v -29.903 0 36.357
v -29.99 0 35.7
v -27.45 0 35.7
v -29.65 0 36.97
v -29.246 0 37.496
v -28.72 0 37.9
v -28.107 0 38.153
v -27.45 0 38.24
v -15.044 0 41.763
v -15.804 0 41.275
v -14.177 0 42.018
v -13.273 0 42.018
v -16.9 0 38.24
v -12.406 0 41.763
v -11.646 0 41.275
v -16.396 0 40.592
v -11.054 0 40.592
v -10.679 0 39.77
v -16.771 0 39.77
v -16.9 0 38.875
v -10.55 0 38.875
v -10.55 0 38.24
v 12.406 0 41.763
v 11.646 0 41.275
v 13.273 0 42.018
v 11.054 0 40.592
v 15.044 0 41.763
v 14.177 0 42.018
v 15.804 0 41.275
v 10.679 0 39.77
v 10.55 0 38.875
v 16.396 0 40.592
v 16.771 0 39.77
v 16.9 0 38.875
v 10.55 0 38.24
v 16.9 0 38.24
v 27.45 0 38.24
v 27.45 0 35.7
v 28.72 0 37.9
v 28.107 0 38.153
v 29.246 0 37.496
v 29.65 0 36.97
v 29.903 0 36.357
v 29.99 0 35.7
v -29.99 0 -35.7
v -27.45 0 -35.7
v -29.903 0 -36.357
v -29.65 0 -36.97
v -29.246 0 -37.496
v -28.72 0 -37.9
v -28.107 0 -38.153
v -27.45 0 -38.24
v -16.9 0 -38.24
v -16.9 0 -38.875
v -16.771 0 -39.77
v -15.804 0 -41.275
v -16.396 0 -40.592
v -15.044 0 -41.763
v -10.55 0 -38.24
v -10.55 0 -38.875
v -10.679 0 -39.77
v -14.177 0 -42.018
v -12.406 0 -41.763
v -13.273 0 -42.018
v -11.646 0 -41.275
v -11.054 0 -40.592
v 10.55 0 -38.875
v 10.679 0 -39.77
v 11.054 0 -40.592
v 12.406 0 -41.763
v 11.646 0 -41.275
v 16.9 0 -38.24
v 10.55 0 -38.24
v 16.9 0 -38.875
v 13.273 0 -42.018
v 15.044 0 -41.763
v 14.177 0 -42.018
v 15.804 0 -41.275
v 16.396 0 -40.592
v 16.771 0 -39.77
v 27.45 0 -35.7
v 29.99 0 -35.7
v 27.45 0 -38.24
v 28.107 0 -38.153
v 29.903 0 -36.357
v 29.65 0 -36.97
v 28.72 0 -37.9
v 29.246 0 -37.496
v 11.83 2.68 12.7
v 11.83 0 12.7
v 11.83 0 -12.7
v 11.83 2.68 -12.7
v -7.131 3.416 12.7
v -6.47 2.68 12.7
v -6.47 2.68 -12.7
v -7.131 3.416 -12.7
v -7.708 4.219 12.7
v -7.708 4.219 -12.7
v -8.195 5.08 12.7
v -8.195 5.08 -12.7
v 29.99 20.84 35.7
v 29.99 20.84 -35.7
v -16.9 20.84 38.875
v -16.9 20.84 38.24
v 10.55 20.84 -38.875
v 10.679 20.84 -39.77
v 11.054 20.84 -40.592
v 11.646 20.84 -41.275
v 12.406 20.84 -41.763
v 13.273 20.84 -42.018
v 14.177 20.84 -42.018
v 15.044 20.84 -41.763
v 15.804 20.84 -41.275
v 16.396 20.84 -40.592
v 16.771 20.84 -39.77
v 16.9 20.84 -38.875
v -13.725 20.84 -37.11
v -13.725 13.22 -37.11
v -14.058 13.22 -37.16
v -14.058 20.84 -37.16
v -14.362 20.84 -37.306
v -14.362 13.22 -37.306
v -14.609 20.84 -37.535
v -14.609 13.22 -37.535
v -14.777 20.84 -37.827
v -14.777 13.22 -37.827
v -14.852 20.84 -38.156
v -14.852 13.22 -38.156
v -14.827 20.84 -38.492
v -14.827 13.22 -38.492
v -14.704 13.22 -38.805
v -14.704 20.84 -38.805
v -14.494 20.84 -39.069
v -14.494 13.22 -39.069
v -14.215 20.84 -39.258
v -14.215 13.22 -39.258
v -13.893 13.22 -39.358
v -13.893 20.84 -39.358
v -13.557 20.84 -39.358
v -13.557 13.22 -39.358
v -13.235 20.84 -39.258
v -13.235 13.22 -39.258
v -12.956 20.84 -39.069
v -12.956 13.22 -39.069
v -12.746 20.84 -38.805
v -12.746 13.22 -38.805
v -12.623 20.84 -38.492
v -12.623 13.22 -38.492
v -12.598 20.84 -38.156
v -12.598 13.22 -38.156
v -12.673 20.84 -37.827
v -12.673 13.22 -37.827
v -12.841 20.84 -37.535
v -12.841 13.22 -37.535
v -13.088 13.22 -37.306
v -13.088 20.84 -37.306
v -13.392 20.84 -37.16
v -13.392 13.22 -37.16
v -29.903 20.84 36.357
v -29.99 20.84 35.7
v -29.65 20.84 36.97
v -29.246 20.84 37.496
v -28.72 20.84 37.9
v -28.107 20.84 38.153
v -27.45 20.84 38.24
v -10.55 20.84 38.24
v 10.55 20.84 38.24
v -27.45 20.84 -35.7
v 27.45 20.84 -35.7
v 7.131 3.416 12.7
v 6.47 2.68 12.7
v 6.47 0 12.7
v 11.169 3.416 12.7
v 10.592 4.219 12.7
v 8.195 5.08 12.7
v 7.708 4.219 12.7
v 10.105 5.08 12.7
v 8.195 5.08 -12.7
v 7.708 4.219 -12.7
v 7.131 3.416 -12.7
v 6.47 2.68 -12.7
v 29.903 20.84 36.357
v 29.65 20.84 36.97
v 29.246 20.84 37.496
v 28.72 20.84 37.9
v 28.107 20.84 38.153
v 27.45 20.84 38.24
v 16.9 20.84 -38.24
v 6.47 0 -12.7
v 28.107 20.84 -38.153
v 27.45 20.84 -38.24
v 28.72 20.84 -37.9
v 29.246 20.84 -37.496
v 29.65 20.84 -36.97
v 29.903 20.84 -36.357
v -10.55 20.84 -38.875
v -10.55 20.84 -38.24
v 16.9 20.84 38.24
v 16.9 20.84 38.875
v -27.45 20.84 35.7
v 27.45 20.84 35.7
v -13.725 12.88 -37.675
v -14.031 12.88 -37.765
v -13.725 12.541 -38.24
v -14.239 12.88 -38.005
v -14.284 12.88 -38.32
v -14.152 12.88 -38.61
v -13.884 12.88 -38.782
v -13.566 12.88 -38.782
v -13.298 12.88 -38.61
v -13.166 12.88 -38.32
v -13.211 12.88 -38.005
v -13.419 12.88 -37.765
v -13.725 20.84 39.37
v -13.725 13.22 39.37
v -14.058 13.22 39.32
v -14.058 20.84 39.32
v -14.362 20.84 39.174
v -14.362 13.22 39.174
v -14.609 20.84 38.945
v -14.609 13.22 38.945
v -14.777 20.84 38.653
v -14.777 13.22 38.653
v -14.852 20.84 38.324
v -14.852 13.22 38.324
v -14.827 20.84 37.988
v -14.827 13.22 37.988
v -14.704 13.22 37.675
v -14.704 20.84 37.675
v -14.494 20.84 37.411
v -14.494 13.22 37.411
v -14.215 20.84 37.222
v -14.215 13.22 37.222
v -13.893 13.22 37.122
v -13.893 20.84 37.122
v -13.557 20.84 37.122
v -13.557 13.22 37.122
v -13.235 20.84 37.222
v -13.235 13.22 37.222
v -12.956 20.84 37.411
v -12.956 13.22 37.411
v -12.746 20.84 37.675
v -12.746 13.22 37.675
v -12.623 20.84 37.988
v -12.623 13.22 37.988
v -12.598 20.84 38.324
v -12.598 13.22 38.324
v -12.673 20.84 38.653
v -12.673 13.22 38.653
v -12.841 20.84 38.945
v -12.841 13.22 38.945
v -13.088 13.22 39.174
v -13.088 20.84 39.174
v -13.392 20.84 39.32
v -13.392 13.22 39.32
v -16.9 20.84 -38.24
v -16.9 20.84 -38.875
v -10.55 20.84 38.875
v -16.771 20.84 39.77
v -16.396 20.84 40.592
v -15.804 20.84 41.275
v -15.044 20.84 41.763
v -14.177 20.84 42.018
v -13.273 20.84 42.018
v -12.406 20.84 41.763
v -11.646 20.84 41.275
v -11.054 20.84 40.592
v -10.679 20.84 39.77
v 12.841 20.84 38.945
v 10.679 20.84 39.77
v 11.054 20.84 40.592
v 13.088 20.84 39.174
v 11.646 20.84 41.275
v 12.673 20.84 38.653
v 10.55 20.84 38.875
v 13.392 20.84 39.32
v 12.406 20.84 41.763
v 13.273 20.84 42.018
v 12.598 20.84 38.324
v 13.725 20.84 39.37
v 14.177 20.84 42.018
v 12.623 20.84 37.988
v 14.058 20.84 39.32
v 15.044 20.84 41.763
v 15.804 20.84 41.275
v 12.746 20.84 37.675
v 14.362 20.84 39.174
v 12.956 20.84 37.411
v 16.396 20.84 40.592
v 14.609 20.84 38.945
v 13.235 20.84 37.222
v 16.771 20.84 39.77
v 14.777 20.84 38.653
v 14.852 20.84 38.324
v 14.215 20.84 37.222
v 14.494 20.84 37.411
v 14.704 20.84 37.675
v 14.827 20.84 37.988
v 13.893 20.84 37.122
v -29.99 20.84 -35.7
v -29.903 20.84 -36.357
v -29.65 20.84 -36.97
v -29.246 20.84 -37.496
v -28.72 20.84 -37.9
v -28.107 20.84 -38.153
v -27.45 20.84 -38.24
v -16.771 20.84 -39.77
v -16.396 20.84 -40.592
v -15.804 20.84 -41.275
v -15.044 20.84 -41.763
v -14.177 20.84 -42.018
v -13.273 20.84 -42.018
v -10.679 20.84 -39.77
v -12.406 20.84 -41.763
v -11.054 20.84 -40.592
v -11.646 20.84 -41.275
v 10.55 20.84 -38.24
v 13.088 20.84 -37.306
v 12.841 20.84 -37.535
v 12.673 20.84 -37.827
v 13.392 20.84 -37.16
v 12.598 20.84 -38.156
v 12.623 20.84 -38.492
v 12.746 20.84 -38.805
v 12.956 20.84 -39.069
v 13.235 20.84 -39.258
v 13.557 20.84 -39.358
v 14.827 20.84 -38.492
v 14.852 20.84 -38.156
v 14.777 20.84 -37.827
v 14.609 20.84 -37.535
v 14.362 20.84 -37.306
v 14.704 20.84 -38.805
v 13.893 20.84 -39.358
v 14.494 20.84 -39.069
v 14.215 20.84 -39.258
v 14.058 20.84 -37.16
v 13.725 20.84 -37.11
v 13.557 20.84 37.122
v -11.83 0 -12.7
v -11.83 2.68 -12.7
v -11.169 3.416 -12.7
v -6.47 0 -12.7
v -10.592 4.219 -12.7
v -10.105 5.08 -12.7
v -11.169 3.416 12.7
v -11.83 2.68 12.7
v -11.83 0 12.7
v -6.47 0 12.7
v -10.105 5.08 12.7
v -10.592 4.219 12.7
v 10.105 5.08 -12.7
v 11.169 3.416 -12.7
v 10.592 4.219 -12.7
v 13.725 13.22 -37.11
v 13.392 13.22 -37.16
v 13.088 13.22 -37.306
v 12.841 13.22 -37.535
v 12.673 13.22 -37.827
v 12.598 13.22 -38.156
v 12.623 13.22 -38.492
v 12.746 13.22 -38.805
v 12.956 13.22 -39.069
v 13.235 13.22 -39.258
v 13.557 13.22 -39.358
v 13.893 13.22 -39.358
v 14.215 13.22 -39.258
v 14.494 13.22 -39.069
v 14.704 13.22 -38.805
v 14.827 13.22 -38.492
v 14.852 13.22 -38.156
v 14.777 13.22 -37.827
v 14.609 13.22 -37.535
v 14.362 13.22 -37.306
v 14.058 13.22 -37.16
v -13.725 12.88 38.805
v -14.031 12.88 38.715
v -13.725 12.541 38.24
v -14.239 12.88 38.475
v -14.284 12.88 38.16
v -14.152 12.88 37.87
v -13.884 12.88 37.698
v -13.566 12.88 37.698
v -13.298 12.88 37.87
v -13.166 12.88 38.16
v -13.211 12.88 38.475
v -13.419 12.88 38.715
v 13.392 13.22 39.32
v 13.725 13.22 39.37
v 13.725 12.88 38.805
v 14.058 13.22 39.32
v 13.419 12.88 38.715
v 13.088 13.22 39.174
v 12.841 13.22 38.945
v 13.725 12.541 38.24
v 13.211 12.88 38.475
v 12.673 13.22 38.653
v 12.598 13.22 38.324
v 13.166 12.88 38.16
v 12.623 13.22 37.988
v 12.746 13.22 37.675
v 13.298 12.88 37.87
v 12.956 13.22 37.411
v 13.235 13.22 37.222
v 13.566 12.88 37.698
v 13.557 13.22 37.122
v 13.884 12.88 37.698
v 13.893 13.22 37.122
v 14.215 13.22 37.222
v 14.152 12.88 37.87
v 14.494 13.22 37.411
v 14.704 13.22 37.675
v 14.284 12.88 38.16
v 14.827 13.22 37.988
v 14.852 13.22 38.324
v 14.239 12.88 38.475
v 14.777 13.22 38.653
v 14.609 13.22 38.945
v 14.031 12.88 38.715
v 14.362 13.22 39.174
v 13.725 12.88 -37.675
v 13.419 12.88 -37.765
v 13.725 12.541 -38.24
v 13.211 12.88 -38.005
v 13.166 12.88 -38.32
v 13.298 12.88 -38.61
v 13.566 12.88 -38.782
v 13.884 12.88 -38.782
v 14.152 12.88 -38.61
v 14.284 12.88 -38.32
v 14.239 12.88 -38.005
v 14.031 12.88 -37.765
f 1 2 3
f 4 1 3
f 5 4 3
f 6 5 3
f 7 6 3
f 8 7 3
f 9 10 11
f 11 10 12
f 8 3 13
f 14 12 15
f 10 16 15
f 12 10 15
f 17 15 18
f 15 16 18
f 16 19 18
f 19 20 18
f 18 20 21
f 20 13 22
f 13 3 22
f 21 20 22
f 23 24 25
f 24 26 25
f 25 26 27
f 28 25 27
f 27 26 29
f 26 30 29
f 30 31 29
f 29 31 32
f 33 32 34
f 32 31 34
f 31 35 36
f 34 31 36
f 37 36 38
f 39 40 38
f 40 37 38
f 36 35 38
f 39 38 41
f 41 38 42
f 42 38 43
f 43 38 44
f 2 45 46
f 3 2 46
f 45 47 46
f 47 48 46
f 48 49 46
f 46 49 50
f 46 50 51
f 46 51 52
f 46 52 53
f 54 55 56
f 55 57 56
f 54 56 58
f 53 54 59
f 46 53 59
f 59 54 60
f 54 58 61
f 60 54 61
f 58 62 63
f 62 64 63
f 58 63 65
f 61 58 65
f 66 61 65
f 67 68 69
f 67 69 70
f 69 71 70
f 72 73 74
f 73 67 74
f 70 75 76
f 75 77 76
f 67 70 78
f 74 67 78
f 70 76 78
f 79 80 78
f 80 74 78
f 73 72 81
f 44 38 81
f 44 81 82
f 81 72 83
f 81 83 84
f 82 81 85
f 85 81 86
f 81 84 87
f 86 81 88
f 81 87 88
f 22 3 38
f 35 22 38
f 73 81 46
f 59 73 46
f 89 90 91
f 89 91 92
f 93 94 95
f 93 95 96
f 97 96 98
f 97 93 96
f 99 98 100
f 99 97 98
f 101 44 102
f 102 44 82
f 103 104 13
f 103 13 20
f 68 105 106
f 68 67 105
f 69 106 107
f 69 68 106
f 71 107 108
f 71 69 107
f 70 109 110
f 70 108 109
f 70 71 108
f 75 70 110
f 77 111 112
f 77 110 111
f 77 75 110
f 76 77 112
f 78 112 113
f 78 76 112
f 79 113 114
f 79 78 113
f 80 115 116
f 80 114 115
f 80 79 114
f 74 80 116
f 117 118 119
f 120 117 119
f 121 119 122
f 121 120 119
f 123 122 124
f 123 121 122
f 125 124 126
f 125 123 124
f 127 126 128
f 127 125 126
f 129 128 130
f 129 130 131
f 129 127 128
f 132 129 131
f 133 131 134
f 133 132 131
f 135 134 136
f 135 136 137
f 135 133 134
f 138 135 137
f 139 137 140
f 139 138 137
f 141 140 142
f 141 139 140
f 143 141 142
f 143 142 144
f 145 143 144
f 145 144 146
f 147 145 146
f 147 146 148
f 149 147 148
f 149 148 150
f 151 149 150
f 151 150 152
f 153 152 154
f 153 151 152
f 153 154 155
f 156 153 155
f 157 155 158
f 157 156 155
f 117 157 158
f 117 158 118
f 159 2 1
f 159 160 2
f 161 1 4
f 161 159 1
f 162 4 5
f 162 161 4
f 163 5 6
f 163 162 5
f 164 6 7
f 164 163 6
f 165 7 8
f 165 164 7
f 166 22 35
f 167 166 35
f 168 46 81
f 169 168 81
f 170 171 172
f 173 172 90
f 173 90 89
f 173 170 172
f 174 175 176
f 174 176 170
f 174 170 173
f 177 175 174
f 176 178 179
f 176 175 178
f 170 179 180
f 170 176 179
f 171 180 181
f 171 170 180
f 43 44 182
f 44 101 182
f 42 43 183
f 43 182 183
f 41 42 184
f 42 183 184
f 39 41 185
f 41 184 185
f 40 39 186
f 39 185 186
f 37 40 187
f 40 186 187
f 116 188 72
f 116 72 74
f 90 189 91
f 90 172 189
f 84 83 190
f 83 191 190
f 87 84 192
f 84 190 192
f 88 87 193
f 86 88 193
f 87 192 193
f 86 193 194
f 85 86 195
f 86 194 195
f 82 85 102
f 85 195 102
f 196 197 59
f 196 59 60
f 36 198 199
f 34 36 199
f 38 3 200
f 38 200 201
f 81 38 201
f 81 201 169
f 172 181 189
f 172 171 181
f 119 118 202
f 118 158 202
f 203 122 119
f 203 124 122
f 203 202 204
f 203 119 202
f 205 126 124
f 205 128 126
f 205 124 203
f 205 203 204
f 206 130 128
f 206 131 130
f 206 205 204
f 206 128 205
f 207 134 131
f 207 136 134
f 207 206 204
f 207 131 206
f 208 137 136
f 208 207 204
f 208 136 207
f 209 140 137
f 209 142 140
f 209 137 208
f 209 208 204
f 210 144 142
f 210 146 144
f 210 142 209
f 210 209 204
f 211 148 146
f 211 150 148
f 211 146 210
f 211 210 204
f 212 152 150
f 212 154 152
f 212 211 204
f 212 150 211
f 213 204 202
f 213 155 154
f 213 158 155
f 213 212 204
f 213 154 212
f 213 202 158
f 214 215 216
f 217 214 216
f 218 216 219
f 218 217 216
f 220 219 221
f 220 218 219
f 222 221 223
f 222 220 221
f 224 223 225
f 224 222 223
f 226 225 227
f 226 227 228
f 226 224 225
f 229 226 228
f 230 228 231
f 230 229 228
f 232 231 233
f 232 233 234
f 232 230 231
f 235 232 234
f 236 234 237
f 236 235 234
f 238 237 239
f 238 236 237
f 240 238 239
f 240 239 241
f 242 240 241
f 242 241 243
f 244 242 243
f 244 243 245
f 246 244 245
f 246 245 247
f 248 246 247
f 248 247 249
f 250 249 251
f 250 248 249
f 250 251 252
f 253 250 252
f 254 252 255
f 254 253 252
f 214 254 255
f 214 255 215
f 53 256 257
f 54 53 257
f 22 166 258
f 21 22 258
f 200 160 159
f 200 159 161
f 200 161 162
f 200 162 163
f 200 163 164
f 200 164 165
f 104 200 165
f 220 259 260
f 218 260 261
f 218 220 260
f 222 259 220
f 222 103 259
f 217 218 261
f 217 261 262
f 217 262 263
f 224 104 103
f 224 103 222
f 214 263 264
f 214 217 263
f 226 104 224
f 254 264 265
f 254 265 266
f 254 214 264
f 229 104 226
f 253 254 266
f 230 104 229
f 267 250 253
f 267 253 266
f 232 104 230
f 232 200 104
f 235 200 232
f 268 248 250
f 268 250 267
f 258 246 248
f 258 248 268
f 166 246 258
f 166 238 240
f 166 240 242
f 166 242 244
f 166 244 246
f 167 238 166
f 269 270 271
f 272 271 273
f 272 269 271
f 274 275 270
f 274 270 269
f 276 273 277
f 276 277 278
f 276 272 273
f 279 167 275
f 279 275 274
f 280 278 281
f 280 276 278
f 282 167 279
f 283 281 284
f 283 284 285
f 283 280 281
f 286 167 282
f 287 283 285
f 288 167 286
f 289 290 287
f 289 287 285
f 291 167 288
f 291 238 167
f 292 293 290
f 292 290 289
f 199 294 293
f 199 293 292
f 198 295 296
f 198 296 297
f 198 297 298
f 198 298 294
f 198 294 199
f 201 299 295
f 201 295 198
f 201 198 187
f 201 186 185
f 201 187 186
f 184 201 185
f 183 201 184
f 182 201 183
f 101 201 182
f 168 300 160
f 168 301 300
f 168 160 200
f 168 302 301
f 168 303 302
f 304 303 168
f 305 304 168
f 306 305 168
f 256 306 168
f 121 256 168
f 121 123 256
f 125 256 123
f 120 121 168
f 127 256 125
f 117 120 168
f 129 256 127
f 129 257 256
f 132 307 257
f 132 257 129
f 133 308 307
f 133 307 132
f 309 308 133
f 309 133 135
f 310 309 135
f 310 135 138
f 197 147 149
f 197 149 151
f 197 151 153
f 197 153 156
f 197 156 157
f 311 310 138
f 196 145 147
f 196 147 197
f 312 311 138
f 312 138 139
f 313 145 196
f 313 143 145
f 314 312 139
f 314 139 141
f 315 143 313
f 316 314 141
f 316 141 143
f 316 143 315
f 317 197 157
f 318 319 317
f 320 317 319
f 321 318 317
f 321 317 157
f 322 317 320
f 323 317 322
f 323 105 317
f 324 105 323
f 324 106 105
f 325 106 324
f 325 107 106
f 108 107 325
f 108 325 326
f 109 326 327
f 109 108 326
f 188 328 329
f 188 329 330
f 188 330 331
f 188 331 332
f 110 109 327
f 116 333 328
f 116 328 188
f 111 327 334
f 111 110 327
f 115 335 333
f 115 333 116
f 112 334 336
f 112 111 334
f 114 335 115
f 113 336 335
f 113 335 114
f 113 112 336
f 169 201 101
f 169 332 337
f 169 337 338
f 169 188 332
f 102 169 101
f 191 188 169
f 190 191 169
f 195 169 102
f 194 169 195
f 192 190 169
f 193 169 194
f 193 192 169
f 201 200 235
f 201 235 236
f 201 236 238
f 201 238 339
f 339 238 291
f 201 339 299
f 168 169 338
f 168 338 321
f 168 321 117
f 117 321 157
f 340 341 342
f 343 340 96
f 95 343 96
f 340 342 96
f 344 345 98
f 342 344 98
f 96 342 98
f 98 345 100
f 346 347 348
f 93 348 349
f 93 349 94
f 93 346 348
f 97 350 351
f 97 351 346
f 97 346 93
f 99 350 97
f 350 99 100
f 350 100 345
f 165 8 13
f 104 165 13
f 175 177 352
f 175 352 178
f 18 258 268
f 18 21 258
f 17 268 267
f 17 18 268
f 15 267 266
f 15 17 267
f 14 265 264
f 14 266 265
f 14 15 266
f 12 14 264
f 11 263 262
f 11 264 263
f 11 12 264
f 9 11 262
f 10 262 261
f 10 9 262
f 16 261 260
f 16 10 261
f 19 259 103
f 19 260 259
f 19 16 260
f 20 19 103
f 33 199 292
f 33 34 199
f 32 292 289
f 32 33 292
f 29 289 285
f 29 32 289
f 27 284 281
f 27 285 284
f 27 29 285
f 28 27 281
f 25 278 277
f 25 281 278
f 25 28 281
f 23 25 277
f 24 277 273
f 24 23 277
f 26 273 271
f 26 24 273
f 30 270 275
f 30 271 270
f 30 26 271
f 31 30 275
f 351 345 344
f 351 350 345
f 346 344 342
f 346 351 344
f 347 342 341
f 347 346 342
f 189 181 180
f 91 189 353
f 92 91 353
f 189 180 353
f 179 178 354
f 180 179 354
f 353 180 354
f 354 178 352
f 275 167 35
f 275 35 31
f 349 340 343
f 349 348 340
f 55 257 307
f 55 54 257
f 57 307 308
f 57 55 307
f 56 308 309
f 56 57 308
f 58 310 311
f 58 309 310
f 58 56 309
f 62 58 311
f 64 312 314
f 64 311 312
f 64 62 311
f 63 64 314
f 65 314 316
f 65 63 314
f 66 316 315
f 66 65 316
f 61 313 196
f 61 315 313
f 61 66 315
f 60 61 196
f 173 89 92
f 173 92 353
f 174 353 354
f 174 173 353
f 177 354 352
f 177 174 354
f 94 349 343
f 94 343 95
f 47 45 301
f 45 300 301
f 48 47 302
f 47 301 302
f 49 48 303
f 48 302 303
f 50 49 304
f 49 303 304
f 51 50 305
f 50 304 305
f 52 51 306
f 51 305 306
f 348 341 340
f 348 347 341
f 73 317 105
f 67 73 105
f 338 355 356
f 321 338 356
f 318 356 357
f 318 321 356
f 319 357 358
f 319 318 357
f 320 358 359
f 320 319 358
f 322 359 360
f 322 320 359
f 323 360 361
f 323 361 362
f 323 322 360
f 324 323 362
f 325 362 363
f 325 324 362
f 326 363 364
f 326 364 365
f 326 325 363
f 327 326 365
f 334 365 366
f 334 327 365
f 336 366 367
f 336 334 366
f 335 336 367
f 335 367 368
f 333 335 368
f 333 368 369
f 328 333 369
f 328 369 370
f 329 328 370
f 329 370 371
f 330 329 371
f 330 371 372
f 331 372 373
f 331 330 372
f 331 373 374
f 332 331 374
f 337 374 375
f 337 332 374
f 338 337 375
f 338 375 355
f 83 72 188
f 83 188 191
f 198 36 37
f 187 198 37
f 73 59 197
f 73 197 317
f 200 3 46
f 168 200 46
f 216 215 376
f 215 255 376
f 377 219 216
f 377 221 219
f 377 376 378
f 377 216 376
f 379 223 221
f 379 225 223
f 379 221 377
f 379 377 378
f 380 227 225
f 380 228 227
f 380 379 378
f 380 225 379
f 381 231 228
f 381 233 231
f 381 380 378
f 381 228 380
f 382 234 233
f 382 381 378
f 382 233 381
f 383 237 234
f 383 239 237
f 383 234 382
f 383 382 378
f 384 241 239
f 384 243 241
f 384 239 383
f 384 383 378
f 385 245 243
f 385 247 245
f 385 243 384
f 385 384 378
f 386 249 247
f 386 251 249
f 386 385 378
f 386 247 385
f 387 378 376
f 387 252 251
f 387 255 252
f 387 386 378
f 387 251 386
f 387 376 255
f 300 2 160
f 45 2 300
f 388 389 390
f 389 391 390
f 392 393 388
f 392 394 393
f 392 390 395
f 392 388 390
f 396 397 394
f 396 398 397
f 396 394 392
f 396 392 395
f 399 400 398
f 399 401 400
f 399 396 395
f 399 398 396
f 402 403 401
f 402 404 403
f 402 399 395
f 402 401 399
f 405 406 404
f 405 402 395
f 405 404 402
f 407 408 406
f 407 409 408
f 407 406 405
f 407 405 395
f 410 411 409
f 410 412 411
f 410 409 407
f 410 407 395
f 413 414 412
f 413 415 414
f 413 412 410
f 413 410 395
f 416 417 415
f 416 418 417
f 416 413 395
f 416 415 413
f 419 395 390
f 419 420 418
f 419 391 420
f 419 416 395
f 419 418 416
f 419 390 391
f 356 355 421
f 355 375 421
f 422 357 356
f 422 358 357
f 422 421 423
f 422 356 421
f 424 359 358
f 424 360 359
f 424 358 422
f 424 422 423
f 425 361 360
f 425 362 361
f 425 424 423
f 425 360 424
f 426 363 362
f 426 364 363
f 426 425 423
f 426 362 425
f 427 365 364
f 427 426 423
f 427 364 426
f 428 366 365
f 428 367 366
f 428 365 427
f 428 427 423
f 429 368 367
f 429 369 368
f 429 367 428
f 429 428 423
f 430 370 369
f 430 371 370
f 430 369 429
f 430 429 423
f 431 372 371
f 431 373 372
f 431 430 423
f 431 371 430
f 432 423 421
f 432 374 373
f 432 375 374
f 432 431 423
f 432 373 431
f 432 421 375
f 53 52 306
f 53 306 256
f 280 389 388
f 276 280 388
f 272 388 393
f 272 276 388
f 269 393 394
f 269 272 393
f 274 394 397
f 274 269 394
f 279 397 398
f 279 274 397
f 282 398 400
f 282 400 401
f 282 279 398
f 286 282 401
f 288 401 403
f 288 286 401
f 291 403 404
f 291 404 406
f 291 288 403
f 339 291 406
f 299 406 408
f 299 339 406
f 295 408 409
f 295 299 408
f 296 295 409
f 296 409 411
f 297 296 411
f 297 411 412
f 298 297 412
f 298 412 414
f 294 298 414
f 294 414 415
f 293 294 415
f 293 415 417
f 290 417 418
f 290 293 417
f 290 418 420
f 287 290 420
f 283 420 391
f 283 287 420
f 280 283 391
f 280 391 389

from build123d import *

# Parameters (mm, degrees)
BOSS_EXTRUDE1_OUTLINE_W        = 59.98
BOSS_EXTRUDE1_OUTLINE_H        = 76.48
BOSS_EXTRUDE1_OUTLINE_W_2      = 54.9
BOSS_EXTRUDE1_OUTLINE_H_2      = 71.4
BOSS_EXTRUDE1_DEPTH            = 20.839999976
BOSS_EXTRUDE2_DEPTH            = 12.7
LPATTERN2_COUNT                = 2
LPATTERN2_PITCH                = 18.3
SKETCH6_W                      = 6.35
SKETCH6_H                      = 3.81
BOSS_EXTRUDE3_DEPTH            = 20.839999976
MIRROR2_COPY_1_SKETCH_W        = 6.35
MIRROR2_COPY_1_SKETCH_H        = 3.81
MIRROR2_COPY_1_DEPTH           = 20.839999976
F_4_40_TAPPED_HOLE1_AT_2_COUNT = 2
F_4_40_TAPPED_HOLE1_AT_2_PITCH = 27.45
F_4_40_TAPPED_HOLE1_AT_3_COUNT = 2
F_4_40_TAPPED_HOLE1_AT_3_PITCH = 81.25695601
F_4_40_TAPPED_HOLE1_AT_4_COUNT = 2
F_4_40_TAPPED_HOLE1_AT_4_PITCH = 76.48
FILLET1_RADIUS                 = 3.175
FILLET1_LENGTH                 = 20.839999976
FILLET2_RADIUS                 = 3.175
FILLET2_LENGTH                 = 20.839999976
FILLET3_RADIUS                 = 3.175
FILLET3_LENGTH                 = 20.839999976
FILLET4_RADIUS                 = 3.175
FILLET4_LENGTH                 = 20.839999976
FILLET5_R                      = 2.54


# Read off the part's stored shape, not the designer's step: Boss-Extrude1
with BuildPart() as part:
    # Boss-Extrude1 outline → Boss-Extrude1 (new body)
    with BuildSketch(Plane(origin=(0, 0, 0), x_dir=(1, 0, 0), z_dir=(0, 1, 0))):
        Rectangle(BOSS_EXTRUDE1_OUTLINE_W, BOSS_EXTRUDE1_OUTLINE_H)
        Rectangle(BOSS_EXTRUDE1_OUTLINE_W_2, BOSS_EXTRUDE1_OUTLINE_H_2, mode=Mode.SUBTRACT)
    extrude(amount=BOSS_EXTRUDE1_DEPTH)

    # Sketch6 → Boss-Extrude3 (add)
    with BuildSketch(Plane(origin=(0, 20.839999976, 0), x_dir=(1, 0, 0), z_dir=(0, 1, 0))):
        with Locations((-13.725, 40.145)):
            Rectangle(SKETCH6_W, SKETCH6_H)
    boss_extrude3 = extrude(amount=-BOSS_EXTRUDE3_DEPTH)

    # Mirror1: Boss-Extrude3 across plane
    add(boss_extrude3.mirror(Plane(origin=(0, 0, 0), x_dir=(0, 0, 1), z_dir=(1, 0, 0))))

    # Mirror2: Boss-Extrude3 across plane
    add(boss_extrude3.mirror(Plane.XY))

    # Mirror2 copy 1 sketch → Mirror2 copy 1 (add)
    with BuildSketch(Plane(origin=(0, 20.839999976, 0), x_dir=(-1, 0, 0), z_dir=(0, 1, 0))):
        with Locations((-13.725, 40.145)):
            Rectangle(MIRROR2_COPY_1_SKETCH_W, MIRROR2_COPY_1_SKETCH_H)
    extrude(amount=-MIRROR2_COPY_1_DEPTH)

    # Sketch7 → #4-40 Tapped Hole1 (revolve, cut)
    with BuildSketch(Plane(origin=(-13.725, 20.839999976, -38.24), x_dir=(0, 0, 1), z_dir=(1, 0, 0))):
        Polygon((0, 0), (0, 8.299152758), (1.1303, 7.62), (1.1303, 0), align=None)
    f_4_40_tapped_hole1 = revolve(axis=Axis((-13.725, 27.189999976, -38.24), (0, -1, 0)), mode=Mode.SUBTRACT)

    # #4-40 Tapped Hole1 at 2: #4-40 Tapped Hole1 ×2
    with Locations(*[(i * F_4_40_TAPPED_HOLE1_AT_2_PITCH, 0, 0) for i in range(1, F_4_40_TAPPED_HOLE1_AT_2_COUNT)]):
        add(f_4_40_tapped_hole1, mode=Mode.SUBTRACT)

    # #4-40 Tapped Hole1 at 3: #4-40 Tapped Hole1 ×2
    with Locations(*[Vector(0.3378172324920079, 0, 0.9412117282691715) * (i * F_4_40_TAPPED_HOLE1_AT_3_PITCH) for i in range(1, F_4_40_TAPPED_HOLE1_AT_3_COUNT)]):
        add(f_4_40_tapped_hole1, mode=Mode.SUBTRACT)

    # #4-40 Tapped Hole1 at 4: #4-40 Tapped Hole1 ×2
    with Locations(*[(0, 0, i * F_4_40_TAPPED_HOLE1_AT_4_PITCH) for i in range(1, F_4_40_TAPPED_HOLE1_AT_4_COUNT)]):
        add(f_4_40_tapped_hole1, mode=Mode.SUBTRACT)

    # Fillet1: full round fillet: the end face becomes a half cylinder, R = half its width
    fillet1_face = Plane((-13.725, 10.419999988, -42.05), x_dir=(0, -1, 0), z_dir=(0, 0, -1))  # on the end face: x along it, z out of the body
    fillet1_slab = fillet1_face.offset(-FILLET1_RADIUS / 2) * Box(FILLET1_LENGTH, 2 * FILLET1_RADIUS, FILLET1_RADIUS, mode=Mode.PRIVATE)  # the body's end, R deep
    fillet1_round = Plane((-13.725, 10.419999988, -38.875), x_dir=(0, 0, -1), z_dir=(0, -1, 0)) * Cylinder(FILLET1_RADIUS, FILLET1_LENGTH, mode=Mode.PRIVATE)  # its axis R under the face
    add(fillet1_slab - fillet1_round, mode=Mode.SUBTRACT)

    # Fillet2: full round fillet: the end face becomes a half cylinder, R = half its width
    fillet2_face = Plane((13.725, 10.419999988, -42.05), x_dir=(0, -1, 0), z_dir=(0, 0, -1))  # on the end face: x along it, z out of the body
    fillet2_slab = fillet2_face.offset(-FILLET2_RADIUS / 2) * Box(FILLET2_LENGTH, 2 * FILLET2_RADIUS, FILLET2_RADIUS, mode=Mode.PRIVATE)  # the body's end, R deep
    fillet2_round = Plane((13.725, 10.419999988, -38.875), x_dir=(0, 0, -1), z_dir=(0, -1, 0)) * Cylinder(FILLET2_RADIUS, FILLET2_LENGTH, mode=Mode.PRIVATE)  # its axis R under the face
    add(fillet2_slab - fillet2_round, mode=Mode.SUBTRACT)

    # Fillet3: full round fillet: the end face becomes a half cylinder, R = half its width
    fillet3_face = Plane((13.725, 10.419999988, 42.05), x_dir=(0, -1, 0), z_dir=(0, 0, 1))  # on the end face: x along it, z out of the body
    fillet3_slab = fillet3_face.offset(-FILLET3_RADIUS / 2) * Box(FILLET3_LENGTH, 2 * FILLET3_RADIUS, FILLET3_RADIUS, mode=Mode.PRIVATE)  # the body's end, R deep
    fillet3_round = Plane((13.725, 10.419999988, 38.875), x_dir=(0, 0, 1), z_dir=(0, -1, 0)) * Cylinder(FILLET3_RADIUS, FILLET3_LENGTH, mode=Mode.PRIVATE)  # its axis R under the face
    add(fillet3_slab - fillet3_round, mode=Mode.SUBTRACT)

    # Fillet4: full round fillet: the end face becomes a half cylinder, R = half its width
    fillet4_face = Plane((-13.725, 10.419999988, 42.05), x_dir=(0, -1, 0), z_dir=(0, 0, 1))  # on the end face: x along it, z out of the body
    fillet4_slab = fillet4_face.offset(-FILLET4_RADIUS / 2) * Box(FILLET4_LENGTH, 2 * FILLET4_RADIUS, FILLET4_RADIUS, mode=Mode.PRIVATE)  # the body's end, R deep
    fillet4_round = Plane((-13.725, 10.419999988, 38.875), x_dir=(0, 0, 1), z_dir=(0, -1, 0)) * Cylinder(FILLET4_RADIUS, FILLET4_LENGTH, mode=Mode.PRIVATE)  # its axis R under the face
    add(fillet4_slab - fillet4_round, mode=Mode.SUBTRACT)

    # Fillet5
    fillet5_edges = [part.edges().sort_by_distance(p)[0] for p in [
        (29.99, 10.419999988, 38.24),
        (29.99, 10.419999988, -38.24),
        (-29.99, 10.419999988, -38.24),
        (-29.99, 10.419999988, 38.24),
    ]]
    fillet(fillet5_edges, radius=FILLET5_R)


with BuildPart() as body_2:
    # Sketch4 → Boss-Extrude2 (new, symmetric)
    with BuildSketch(Plane.XY):
        with BuildLine():
            Line((-11.829972952, 0), (-6.470027048, 0))
            Line((-6.470027048, 0), (-6.470027048, 2.679972952))
            ThreePointArc((-6.470027048, 2.679972952), (-7.430046898, 3.809877988), (-8.19497407, 5.08))
            Line((-8.19497407, 5.08), (-10.10502593, 5.08))
            ThreePointArc((-10.10502593, 5.08), (-10.869953102, 3.809877988), (-11.829972952, 2.679972952))
            Line((-11.829972952, 2.679972952), (-11.829972952, 0))
        make_face()
    extrude(amount=BOSS_EXTRUDE2_DEPTH, both=True)


with BuildPart() as lpattern2_1:
    # LPattern2: pattern copy
    add(body_2.part.moved(Location(Vector(1, 0, 0) * (1 * LPATTERN2_PITCH))))


solid = Compound([part.part, body_2.part, lpattern2_1.part])
